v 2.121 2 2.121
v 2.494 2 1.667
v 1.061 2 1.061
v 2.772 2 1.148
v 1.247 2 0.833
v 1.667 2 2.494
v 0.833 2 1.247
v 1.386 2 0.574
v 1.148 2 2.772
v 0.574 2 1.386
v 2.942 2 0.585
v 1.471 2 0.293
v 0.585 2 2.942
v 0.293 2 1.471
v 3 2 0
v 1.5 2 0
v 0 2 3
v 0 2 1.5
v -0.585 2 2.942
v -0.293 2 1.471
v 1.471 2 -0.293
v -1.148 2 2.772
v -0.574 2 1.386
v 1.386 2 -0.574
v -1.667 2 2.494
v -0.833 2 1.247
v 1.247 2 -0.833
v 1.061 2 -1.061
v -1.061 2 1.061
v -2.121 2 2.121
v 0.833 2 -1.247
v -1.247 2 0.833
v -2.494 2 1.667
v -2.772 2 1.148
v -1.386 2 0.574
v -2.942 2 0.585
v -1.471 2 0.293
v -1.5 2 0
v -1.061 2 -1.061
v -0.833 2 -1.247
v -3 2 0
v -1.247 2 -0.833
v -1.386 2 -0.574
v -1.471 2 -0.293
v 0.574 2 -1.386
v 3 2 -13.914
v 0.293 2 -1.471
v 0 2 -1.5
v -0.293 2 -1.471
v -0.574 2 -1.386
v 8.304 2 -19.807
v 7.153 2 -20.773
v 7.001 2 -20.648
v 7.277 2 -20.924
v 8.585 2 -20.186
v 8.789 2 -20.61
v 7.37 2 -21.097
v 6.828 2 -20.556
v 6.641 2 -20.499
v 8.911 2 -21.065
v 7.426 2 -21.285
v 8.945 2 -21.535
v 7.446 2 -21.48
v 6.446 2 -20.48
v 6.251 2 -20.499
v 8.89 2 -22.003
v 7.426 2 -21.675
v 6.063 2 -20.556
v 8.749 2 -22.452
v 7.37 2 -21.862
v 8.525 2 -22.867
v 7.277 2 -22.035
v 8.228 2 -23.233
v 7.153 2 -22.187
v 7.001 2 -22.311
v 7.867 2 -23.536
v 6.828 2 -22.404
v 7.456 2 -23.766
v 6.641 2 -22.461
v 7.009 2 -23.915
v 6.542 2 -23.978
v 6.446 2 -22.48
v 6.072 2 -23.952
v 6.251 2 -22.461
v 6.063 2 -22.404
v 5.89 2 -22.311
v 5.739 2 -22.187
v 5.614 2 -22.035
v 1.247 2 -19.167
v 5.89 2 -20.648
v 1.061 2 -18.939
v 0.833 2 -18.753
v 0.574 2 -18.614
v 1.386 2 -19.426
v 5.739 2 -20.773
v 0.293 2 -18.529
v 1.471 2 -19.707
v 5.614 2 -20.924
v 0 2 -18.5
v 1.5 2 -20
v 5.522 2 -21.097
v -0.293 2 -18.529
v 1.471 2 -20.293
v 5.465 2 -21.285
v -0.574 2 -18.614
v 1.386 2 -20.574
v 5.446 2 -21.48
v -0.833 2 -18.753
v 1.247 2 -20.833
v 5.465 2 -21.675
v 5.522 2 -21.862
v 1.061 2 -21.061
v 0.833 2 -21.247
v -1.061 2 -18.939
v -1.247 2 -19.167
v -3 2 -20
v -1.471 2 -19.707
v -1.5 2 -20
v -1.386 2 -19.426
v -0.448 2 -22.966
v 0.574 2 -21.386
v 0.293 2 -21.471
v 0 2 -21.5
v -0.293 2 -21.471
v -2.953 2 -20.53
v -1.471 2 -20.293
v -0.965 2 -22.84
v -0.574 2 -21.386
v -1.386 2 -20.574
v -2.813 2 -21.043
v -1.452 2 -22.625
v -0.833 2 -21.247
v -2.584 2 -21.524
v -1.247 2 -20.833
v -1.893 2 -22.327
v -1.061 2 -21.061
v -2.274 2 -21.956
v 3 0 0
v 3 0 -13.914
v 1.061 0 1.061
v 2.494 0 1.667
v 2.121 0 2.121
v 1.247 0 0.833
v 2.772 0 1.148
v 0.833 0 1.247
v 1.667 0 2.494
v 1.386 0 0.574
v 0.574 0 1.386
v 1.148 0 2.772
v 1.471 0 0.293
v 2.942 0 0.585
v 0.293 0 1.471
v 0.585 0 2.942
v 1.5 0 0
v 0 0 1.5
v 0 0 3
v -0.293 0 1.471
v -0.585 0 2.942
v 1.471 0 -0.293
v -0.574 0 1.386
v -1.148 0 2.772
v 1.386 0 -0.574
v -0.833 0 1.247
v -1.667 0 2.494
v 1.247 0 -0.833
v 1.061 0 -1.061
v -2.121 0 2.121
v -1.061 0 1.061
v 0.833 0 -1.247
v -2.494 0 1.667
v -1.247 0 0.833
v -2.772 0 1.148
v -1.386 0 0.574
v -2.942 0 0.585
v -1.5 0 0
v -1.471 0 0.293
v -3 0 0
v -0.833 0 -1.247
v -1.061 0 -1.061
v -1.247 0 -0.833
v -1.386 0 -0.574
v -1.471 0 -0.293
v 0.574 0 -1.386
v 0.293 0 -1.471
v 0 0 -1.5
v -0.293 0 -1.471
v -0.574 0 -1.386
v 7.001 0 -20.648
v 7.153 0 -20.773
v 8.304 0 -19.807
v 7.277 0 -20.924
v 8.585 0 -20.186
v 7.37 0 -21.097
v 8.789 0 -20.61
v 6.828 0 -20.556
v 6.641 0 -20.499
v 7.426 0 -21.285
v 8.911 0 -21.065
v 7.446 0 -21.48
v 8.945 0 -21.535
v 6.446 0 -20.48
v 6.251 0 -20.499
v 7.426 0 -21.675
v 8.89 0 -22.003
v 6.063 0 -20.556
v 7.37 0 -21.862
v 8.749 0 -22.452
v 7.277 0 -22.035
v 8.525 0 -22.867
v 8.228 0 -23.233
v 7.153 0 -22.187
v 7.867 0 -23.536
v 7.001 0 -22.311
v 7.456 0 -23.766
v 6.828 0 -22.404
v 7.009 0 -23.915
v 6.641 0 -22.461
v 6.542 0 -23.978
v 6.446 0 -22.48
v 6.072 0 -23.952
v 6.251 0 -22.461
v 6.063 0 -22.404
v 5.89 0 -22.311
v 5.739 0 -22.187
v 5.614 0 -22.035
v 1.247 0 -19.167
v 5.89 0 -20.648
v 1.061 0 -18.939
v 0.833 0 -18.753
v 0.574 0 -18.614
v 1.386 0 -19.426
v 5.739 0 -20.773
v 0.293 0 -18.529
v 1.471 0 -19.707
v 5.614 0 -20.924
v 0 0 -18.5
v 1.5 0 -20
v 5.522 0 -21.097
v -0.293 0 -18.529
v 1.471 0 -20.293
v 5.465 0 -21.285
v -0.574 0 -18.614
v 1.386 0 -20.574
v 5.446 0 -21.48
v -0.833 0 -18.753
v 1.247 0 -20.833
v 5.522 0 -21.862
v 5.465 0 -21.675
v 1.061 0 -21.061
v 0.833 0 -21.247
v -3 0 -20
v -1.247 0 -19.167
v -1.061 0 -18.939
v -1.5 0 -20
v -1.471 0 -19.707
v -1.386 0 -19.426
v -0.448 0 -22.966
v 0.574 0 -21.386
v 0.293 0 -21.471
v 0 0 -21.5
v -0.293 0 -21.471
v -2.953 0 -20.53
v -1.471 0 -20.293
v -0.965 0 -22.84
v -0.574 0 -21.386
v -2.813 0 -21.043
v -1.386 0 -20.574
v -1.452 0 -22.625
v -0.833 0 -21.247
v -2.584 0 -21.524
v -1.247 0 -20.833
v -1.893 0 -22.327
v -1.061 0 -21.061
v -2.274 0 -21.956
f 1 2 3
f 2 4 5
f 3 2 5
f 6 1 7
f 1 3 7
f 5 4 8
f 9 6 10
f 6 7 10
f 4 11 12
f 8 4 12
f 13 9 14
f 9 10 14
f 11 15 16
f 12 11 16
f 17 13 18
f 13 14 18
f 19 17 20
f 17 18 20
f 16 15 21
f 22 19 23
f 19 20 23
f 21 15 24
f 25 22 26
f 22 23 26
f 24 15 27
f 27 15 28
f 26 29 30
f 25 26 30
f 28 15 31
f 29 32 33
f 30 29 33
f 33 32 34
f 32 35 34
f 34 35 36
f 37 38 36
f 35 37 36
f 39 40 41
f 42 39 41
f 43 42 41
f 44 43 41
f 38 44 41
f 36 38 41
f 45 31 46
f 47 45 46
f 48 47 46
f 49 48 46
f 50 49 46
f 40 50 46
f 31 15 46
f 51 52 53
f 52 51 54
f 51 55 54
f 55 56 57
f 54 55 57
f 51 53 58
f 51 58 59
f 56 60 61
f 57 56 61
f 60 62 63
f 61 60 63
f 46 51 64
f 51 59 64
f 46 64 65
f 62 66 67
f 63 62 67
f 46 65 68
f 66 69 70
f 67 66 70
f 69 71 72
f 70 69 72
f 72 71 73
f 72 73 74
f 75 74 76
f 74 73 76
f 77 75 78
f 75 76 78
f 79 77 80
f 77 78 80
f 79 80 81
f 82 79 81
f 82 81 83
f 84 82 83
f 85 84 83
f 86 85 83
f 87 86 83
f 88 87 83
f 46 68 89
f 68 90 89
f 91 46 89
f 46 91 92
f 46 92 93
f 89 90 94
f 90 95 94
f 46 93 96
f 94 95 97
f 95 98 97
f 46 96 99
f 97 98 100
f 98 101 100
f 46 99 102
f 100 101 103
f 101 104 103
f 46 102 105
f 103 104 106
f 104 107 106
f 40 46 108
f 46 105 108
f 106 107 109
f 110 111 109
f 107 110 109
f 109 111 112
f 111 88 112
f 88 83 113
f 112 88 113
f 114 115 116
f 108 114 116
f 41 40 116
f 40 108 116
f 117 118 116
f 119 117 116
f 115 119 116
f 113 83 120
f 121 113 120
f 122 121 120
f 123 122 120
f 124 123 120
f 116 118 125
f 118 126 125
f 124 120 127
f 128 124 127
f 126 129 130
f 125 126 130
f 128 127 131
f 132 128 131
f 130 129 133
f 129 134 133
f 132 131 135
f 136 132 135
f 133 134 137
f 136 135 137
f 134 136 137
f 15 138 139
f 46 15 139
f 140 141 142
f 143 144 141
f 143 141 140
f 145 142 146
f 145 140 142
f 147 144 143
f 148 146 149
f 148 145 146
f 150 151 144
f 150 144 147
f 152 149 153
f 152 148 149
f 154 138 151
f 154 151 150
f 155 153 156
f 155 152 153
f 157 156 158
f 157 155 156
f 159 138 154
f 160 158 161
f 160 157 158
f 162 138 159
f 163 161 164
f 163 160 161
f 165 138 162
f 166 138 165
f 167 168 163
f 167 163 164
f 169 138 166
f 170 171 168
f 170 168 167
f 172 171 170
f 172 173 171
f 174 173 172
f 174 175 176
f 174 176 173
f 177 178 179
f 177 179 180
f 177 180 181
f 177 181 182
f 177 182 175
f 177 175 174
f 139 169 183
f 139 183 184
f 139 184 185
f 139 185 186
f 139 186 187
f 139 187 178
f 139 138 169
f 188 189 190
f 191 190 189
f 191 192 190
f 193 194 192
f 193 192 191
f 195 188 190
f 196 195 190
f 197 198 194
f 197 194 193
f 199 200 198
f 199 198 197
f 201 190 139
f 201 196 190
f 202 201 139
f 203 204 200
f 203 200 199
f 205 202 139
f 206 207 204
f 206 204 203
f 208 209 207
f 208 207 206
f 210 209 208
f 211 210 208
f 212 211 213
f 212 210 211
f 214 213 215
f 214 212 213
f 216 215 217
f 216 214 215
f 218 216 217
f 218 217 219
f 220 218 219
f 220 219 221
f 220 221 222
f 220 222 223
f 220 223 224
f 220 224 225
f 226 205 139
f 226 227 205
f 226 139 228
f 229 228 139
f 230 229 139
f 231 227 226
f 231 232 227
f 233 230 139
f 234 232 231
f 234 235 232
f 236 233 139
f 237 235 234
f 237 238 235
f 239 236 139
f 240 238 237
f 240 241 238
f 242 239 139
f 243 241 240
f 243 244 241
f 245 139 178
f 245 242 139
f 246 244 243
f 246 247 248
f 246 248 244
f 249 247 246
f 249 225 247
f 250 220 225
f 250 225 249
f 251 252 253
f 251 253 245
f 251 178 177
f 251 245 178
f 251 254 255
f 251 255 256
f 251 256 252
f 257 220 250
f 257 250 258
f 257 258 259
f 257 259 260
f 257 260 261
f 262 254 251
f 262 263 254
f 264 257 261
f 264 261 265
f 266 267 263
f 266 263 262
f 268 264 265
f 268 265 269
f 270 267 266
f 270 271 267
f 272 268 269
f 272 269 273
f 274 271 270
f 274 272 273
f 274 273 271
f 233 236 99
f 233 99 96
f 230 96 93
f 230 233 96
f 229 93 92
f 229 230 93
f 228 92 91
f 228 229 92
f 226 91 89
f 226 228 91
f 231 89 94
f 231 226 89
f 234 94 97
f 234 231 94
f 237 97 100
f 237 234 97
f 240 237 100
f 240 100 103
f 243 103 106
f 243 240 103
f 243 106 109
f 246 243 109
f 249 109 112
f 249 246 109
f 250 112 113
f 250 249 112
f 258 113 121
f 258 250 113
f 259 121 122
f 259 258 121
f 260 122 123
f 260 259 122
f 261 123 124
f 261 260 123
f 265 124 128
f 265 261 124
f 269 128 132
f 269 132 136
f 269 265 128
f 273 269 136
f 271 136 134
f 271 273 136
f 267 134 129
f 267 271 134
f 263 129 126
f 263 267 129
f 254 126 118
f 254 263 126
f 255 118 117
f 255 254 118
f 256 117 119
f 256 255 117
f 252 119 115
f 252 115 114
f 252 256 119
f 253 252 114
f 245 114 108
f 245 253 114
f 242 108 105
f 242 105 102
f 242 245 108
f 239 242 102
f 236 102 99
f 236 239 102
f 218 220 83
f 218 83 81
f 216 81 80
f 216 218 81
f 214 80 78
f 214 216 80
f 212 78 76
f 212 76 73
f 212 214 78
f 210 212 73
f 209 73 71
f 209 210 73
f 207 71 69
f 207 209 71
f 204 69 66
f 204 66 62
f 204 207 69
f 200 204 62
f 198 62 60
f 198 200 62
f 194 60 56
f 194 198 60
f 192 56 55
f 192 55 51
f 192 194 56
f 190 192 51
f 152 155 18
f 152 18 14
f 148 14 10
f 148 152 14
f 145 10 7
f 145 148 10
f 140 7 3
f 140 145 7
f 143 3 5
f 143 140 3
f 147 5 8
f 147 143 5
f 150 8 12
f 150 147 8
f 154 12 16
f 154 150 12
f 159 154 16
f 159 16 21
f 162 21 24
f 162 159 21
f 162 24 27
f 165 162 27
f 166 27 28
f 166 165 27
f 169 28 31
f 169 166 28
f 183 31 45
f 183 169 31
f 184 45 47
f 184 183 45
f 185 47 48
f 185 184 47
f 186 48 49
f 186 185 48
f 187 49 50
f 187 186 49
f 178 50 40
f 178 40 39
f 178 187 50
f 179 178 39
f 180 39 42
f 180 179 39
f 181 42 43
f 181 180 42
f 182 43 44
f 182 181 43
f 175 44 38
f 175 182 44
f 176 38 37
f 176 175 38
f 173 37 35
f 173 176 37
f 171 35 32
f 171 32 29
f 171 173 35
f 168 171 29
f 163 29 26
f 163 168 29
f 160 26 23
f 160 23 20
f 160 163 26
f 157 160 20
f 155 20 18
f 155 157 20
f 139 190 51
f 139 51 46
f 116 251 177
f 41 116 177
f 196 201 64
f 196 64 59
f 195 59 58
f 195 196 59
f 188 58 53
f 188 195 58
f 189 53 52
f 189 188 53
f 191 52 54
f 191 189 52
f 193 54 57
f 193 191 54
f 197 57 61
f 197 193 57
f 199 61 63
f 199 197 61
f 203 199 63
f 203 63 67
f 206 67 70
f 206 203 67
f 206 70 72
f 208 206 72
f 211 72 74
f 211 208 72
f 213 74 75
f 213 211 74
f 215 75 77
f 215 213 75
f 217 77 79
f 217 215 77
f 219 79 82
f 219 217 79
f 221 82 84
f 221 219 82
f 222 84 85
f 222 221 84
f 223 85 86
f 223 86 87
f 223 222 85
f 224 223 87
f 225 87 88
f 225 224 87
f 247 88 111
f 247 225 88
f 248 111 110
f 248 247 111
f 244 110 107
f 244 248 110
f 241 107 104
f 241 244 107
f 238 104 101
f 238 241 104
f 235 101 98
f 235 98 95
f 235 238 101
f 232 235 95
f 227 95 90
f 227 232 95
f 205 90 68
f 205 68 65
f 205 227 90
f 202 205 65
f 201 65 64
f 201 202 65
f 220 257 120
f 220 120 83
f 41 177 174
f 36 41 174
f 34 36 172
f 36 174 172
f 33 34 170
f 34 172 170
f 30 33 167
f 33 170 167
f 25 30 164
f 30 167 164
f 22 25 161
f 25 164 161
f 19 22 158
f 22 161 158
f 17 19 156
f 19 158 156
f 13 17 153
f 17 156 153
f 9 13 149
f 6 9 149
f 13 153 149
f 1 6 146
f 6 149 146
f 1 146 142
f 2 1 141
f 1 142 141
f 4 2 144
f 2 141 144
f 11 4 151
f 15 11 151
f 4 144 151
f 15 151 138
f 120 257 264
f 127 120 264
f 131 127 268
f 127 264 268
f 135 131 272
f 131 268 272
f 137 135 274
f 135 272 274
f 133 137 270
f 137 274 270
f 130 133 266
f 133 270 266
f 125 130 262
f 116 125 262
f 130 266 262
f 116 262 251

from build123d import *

# Parameters (mm, degrees)
SKETCH1_R           = 1.5
BOSS_EXTRUDE1_DEPTH = 2
BOSS_EXTRUDE2_START = -2
SKETCH2_R           = 1
BOSS_EXTRUDE2_DEPTH = 2


with BuildPart() as part:
    # Sketch1 → Boss-Extrude1 (new body)
    with BuildSketch(Plane(origin=(0, 0, 0), x_dir=(1, 0, 0), z_dir=(0, 1, 0))):
        with BuildLine():
            Line((3, 0), (3, 20))
            ThreePointArc((3, 20), (0, 23), (-3, 20))
            Line((-3, 20), (-3, 0))
            ThreePointArc((-3, 0), (0, -3), (3, 0))
        make_face()
        with Locations(Location((0, 0, 0), (0, 0, 270))):
            Circle(SKETCH1_R, mode=Mode.SUBTRACT)
        with Locations(Location((0, 20, 0), (0, 0, 270))):
            Circle(SKETCH1_R, mode=Mode.SUBTRACT)
    extrude(amount=BOSS_EXTRUDE1_DEPTH)

    # Sketch2 → Boss-Extrude2 (add)
    with BuildSketch(Plane(origin=(0, 2, 0), x_dir=(1, 0, 0), z_dir=(0, 1, 0)).offset(BOSS_EXTRUDE2_START)):
        with BuildLine():
            Line((8.303850429, 19.807351686), (3, 13.914475038))
            Line((3, 13.914475038), (3, 20))
            ThreePointArc((3, 20), (1.956412946, 22.274301735), (-0.448298923, 22.966315573))
            Line((-0.448298923, 22.966315573), (6.072073621, 23.951738706))
            ThreePointArc((6.072073621, 23.951738706), (8.646793057, 22.665134295), (8.303850429, 19.807351686))
        make_face()
        with Locations(Location((6.445656057, 21.479809062, 0), (0, 0, 270))):
            Circle(SKETCH2_R, mode=Mode.SUBTRACT)
    extrude(amount=BOSS_EXTRUDE2_DEPTH)


solid = part.part
